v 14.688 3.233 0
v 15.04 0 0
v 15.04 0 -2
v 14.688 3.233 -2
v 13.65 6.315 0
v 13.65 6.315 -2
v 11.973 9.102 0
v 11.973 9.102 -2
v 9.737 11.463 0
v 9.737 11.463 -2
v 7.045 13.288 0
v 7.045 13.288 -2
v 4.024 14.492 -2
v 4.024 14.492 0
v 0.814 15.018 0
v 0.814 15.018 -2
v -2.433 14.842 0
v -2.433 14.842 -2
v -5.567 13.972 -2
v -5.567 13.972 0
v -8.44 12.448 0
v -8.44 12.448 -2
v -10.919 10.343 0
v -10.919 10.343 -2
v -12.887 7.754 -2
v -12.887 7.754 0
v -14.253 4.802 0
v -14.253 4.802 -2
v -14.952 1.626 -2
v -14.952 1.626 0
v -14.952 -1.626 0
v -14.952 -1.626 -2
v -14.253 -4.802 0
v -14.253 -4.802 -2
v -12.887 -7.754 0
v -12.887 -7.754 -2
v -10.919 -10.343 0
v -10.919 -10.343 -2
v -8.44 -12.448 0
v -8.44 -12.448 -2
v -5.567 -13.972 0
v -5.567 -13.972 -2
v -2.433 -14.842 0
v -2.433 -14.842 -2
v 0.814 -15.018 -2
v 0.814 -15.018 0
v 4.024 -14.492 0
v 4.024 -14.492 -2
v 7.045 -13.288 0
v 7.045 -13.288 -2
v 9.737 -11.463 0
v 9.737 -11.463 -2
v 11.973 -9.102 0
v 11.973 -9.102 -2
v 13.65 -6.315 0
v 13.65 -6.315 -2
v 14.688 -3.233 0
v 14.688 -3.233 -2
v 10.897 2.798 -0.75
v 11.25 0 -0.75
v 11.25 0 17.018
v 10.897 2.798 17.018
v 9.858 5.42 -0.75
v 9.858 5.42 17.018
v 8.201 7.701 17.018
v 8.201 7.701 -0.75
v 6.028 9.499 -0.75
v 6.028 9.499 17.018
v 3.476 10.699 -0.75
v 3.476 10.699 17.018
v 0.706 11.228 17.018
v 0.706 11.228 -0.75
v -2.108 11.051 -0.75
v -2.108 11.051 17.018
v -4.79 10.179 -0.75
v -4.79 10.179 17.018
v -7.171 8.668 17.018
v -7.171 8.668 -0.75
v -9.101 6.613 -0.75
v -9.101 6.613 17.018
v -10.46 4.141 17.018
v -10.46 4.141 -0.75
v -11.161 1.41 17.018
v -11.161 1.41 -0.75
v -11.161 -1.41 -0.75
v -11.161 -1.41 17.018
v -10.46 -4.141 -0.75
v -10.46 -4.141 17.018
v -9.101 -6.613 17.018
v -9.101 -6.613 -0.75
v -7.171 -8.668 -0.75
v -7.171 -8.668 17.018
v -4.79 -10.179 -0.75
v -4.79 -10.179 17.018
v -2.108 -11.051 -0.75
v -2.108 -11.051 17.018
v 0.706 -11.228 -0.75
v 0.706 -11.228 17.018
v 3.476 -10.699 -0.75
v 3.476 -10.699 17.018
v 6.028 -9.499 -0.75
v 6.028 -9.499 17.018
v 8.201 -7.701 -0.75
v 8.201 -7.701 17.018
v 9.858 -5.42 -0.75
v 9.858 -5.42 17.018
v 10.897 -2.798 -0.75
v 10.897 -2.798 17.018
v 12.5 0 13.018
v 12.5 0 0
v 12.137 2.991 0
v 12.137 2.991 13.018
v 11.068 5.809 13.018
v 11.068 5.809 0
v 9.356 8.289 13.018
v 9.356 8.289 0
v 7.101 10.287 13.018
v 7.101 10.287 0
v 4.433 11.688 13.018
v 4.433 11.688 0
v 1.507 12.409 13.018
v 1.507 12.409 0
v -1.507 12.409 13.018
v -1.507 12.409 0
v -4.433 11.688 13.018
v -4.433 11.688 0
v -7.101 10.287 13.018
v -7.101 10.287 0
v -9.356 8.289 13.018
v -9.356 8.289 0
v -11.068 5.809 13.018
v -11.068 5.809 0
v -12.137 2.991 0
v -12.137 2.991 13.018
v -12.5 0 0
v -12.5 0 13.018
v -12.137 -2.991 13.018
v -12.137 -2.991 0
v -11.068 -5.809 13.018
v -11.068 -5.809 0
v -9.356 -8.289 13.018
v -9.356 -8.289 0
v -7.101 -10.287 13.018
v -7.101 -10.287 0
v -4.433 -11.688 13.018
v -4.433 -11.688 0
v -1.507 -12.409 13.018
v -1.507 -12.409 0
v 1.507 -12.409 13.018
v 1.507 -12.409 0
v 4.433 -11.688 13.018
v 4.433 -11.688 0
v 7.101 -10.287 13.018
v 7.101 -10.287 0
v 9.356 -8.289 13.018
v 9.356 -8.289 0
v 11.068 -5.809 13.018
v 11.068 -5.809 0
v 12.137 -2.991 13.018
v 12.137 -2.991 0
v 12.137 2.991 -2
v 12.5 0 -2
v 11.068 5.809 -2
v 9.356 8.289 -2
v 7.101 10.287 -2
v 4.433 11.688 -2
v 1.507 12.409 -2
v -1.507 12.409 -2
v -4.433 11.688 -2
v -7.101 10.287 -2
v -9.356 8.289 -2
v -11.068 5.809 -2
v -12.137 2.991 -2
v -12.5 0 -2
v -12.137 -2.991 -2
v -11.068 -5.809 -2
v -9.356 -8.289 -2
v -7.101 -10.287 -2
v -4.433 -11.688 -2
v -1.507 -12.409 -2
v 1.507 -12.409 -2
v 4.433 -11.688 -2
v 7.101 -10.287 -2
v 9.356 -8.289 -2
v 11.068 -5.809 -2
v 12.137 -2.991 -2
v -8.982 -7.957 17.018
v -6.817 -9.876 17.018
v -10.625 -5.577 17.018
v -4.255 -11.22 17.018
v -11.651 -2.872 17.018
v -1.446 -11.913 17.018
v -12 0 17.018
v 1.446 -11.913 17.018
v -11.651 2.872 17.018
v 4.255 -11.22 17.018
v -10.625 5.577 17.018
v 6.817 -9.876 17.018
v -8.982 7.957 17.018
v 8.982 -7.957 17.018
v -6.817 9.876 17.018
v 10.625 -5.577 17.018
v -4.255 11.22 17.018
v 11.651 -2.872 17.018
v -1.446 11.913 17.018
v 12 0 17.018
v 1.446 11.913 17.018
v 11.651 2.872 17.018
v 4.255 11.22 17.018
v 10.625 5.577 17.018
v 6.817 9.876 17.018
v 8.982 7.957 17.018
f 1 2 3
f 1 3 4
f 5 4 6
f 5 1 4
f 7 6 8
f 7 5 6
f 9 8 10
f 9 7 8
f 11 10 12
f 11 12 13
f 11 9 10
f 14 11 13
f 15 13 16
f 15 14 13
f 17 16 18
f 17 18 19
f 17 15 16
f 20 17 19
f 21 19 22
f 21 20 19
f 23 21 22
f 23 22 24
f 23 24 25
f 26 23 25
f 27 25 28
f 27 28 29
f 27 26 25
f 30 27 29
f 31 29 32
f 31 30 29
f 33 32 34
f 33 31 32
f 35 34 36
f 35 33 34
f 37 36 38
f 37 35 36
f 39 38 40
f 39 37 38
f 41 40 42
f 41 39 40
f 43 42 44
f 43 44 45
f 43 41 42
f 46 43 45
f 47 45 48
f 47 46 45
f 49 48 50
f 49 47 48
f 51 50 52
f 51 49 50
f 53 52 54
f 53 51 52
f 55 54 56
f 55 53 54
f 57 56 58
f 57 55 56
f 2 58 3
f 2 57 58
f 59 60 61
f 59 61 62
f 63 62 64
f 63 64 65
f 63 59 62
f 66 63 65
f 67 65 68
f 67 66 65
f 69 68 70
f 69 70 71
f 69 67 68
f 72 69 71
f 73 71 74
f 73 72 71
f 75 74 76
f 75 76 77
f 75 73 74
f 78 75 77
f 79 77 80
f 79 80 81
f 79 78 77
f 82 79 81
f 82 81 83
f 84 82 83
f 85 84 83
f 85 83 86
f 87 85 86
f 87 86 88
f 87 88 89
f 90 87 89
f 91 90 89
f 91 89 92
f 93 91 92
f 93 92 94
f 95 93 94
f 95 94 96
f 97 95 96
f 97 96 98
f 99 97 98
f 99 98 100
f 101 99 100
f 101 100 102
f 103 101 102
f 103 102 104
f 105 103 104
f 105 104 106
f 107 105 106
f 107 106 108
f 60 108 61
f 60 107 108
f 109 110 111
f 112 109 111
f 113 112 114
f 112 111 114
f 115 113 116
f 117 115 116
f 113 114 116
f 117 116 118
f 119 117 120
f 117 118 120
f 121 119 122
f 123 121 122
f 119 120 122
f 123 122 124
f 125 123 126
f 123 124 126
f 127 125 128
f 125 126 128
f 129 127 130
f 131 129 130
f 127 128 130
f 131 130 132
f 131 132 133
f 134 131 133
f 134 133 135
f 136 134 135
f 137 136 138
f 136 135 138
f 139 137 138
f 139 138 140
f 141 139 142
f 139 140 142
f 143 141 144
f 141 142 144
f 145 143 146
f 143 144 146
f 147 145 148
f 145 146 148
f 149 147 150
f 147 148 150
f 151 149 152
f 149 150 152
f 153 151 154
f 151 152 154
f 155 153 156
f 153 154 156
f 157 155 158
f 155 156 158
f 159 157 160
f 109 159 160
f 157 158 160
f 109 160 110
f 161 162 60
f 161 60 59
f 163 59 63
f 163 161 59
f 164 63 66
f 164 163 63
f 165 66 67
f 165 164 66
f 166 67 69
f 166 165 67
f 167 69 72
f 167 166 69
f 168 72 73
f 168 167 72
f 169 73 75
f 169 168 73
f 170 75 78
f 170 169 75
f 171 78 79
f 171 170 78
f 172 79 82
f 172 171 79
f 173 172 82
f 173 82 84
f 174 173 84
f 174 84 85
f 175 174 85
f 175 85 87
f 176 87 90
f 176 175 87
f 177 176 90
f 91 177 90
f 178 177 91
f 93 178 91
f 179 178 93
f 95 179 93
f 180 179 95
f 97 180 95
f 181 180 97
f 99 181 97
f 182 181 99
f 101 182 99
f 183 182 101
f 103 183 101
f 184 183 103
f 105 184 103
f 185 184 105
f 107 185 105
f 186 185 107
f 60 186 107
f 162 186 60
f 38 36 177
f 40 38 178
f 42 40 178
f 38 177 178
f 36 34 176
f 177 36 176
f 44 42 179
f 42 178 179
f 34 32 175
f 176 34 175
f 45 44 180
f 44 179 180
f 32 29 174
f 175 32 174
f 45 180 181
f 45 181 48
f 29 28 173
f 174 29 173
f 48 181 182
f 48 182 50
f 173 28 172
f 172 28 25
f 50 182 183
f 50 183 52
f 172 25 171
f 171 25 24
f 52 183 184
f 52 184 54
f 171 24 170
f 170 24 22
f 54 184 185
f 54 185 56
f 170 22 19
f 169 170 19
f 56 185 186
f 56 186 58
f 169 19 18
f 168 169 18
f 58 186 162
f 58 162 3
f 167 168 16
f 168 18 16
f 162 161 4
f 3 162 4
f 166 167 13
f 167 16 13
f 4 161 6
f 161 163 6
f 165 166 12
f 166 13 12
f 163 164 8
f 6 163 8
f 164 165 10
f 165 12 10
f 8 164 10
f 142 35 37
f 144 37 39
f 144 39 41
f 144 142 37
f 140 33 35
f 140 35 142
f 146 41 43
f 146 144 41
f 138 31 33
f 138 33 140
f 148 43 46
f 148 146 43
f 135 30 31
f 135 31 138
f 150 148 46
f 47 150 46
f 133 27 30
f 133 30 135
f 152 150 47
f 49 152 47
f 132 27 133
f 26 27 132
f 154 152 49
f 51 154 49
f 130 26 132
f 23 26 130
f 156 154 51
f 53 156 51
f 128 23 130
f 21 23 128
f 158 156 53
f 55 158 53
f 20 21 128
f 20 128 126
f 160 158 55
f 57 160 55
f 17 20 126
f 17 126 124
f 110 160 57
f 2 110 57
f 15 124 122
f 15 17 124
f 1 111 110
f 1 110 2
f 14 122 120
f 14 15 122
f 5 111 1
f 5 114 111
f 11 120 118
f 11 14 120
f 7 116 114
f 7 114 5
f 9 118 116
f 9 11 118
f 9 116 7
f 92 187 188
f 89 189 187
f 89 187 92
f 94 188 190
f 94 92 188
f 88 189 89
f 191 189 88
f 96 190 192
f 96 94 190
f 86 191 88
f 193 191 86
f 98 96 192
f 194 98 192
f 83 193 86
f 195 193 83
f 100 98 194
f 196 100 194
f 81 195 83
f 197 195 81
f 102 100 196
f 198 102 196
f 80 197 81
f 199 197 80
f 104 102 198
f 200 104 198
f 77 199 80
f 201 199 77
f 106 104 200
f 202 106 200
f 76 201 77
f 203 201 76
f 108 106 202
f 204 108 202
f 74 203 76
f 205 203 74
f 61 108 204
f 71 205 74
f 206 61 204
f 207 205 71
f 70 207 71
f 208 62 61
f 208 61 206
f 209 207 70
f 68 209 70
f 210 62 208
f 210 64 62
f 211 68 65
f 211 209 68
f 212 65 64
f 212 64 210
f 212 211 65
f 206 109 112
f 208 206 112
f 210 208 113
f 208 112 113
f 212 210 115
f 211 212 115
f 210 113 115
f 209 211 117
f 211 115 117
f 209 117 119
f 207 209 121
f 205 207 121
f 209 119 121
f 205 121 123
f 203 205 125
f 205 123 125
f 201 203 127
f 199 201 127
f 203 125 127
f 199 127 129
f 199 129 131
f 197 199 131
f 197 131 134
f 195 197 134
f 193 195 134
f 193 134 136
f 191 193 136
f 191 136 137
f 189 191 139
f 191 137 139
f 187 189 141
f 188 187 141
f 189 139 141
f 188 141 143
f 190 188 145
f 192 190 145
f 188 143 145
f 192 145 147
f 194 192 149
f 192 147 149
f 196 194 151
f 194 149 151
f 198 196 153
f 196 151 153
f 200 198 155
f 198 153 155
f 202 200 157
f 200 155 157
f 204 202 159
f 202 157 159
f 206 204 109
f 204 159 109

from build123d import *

# Parameters (mm, degrees)
F1_R     = 15.04
F1_R_2   = 12.5
F1_R_3   = 11.25
F2_DEPTH = 2
F3_DEPTH = 17.018
F4_SIZE2 = 4
F4_SIZE  = 0.5
F5_SIZE  = 1.25


with BuildPart() as f2:
    # F1 (on Top) → F2 (new body)
    with BuildSketch(Plane.XY):
        Circle(F1_R)
        Circle(F1_R_2, mode=Mode.SUBTRACT)
        Circle(F1_R_2)
        Circle(F1_R_3, mode=Mode.SUBTRACT)
    extrude(amount=-F2_DEPTH)

    # F1 (on Top) → F3 (join)
    with BuildSketch(Plane.XY):
        Circle(F1_R_2)
        Circle(F1_R_3, mode=Mode.SUBTRACT)
    extrude(amount=F3_DEPTH)

    # F4
    f4_edges = [f2.edges().sort_by_distance(p)[0] for p in [
        (-12.5, 0, 17.018),
    ]]
    f4_side = f2.faces().sort_by_distance((-12.146447, 0, 17.018))[0]
    chamfer(f4_edges, length=F4_SIZE, length2=F4_SIZE2, reference=f4_side)

    # F5
    f5_edges = [f2.edges().sort_by_distance(p)[0] for p in [
        (-11.25, 0, -2),
    ]]
    chamfer(f5_edges, length=F5_SIZE)


solid = f2.part
